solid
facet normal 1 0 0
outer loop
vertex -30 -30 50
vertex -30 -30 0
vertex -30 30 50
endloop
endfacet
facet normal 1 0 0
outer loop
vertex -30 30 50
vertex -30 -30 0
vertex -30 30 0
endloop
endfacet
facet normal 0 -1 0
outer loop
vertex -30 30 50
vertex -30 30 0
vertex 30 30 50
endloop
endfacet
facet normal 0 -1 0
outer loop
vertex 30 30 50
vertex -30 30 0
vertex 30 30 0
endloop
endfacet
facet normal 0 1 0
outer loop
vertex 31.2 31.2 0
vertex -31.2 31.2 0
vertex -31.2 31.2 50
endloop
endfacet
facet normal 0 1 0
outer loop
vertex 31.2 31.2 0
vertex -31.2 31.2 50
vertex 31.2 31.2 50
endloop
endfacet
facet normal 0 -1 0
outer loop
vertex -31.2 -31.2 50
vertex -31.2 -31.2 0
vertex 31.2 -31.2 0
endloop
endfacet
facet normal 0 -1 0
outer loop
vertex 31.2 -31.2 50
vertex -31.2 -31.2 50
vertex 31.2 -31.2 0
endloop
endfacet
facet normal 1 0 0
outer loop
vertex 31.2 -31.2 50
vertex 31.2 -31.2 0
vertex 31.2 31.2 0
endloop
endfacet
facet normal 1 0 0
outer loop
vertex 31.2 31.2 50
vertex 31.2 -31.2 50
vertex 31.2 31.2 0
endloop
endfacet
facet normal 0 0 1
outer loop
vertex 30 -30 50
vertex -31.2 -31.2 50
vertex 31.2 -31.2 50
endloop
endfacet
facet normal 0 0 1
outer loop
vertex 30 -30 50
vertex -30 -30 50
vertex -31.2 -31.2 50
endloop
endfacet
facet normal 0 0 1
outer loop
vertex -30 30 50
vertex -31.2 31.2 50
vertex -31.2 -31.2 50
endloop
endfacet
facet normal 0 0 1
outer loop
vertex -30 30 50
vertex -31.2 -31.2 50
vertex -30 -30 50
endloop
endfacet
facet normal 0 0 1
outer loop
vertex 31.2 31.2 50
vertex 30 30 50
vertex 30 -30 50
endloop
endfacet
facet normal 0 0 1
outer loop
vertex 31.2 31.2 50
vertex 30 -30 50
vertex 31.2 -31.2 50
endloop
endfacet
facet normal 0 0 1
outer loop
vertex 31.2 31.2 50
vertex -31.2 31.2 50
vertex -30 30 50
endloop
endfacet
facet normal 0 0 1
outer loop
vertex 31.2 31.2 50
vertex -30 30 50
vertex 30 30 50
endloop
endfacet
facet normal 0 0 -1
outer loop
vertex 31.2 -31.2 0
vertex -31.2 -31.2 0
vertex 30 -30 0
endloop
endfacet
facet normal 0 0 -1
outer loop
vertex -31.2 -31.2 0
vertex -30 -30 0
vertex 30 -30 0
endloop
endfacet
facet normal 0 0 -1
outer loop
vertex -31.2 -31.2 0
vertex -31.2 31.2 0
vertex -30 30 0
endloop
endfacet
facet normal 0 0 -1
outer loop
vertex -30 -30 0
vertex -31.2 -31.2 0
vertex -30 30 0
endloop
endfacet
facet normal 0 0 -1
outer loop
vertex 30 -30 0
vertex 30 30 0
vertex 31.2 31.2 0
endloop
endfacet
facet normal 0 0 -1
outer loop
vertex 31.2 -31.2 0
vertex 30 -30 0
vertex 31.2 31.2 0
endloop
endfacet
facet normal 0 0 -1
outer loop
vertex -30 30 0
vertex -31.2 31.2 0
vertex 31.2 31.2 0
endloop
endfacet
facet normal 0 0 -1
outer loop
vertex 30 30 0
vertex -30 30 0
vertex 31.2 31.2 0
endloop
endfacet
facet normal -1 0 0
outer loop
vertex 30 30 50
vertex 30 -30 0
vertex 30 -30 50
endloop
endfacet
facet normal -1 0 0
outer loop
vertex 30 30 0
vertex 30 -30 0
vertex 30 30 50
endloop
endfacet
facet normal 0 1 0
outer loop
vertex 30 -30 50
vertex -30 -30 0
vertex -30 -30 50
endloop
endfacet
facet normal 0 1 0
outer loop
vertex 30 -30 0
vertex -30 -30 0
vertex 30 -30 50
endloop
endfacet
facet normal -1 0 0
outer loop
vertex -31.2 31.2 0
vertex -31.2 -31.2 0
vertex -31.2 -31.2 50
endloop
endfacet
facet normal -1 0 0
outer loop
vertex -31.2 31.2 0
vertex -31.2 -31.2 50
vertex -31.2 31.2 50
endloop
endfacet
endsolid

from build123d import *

# Parameters (mm, degrees)
F0_W     = 62.4
F0_H     = 62.4
F0_W_2   = 60
F0_H_2   = 60
F1_DEPTH = 50


with BuildPart() as f1:
    # F0 (on Top) → F1 (new body)
    with BuildSketch(Plane.XY):
        Rectangle(F0_W, F0_H)
        Rectangle(F0_W_2, F0_H_2, mode=Mode.SUBTRACT)
    extrude(amount=F1_DEPTH)


solid = f1.part
